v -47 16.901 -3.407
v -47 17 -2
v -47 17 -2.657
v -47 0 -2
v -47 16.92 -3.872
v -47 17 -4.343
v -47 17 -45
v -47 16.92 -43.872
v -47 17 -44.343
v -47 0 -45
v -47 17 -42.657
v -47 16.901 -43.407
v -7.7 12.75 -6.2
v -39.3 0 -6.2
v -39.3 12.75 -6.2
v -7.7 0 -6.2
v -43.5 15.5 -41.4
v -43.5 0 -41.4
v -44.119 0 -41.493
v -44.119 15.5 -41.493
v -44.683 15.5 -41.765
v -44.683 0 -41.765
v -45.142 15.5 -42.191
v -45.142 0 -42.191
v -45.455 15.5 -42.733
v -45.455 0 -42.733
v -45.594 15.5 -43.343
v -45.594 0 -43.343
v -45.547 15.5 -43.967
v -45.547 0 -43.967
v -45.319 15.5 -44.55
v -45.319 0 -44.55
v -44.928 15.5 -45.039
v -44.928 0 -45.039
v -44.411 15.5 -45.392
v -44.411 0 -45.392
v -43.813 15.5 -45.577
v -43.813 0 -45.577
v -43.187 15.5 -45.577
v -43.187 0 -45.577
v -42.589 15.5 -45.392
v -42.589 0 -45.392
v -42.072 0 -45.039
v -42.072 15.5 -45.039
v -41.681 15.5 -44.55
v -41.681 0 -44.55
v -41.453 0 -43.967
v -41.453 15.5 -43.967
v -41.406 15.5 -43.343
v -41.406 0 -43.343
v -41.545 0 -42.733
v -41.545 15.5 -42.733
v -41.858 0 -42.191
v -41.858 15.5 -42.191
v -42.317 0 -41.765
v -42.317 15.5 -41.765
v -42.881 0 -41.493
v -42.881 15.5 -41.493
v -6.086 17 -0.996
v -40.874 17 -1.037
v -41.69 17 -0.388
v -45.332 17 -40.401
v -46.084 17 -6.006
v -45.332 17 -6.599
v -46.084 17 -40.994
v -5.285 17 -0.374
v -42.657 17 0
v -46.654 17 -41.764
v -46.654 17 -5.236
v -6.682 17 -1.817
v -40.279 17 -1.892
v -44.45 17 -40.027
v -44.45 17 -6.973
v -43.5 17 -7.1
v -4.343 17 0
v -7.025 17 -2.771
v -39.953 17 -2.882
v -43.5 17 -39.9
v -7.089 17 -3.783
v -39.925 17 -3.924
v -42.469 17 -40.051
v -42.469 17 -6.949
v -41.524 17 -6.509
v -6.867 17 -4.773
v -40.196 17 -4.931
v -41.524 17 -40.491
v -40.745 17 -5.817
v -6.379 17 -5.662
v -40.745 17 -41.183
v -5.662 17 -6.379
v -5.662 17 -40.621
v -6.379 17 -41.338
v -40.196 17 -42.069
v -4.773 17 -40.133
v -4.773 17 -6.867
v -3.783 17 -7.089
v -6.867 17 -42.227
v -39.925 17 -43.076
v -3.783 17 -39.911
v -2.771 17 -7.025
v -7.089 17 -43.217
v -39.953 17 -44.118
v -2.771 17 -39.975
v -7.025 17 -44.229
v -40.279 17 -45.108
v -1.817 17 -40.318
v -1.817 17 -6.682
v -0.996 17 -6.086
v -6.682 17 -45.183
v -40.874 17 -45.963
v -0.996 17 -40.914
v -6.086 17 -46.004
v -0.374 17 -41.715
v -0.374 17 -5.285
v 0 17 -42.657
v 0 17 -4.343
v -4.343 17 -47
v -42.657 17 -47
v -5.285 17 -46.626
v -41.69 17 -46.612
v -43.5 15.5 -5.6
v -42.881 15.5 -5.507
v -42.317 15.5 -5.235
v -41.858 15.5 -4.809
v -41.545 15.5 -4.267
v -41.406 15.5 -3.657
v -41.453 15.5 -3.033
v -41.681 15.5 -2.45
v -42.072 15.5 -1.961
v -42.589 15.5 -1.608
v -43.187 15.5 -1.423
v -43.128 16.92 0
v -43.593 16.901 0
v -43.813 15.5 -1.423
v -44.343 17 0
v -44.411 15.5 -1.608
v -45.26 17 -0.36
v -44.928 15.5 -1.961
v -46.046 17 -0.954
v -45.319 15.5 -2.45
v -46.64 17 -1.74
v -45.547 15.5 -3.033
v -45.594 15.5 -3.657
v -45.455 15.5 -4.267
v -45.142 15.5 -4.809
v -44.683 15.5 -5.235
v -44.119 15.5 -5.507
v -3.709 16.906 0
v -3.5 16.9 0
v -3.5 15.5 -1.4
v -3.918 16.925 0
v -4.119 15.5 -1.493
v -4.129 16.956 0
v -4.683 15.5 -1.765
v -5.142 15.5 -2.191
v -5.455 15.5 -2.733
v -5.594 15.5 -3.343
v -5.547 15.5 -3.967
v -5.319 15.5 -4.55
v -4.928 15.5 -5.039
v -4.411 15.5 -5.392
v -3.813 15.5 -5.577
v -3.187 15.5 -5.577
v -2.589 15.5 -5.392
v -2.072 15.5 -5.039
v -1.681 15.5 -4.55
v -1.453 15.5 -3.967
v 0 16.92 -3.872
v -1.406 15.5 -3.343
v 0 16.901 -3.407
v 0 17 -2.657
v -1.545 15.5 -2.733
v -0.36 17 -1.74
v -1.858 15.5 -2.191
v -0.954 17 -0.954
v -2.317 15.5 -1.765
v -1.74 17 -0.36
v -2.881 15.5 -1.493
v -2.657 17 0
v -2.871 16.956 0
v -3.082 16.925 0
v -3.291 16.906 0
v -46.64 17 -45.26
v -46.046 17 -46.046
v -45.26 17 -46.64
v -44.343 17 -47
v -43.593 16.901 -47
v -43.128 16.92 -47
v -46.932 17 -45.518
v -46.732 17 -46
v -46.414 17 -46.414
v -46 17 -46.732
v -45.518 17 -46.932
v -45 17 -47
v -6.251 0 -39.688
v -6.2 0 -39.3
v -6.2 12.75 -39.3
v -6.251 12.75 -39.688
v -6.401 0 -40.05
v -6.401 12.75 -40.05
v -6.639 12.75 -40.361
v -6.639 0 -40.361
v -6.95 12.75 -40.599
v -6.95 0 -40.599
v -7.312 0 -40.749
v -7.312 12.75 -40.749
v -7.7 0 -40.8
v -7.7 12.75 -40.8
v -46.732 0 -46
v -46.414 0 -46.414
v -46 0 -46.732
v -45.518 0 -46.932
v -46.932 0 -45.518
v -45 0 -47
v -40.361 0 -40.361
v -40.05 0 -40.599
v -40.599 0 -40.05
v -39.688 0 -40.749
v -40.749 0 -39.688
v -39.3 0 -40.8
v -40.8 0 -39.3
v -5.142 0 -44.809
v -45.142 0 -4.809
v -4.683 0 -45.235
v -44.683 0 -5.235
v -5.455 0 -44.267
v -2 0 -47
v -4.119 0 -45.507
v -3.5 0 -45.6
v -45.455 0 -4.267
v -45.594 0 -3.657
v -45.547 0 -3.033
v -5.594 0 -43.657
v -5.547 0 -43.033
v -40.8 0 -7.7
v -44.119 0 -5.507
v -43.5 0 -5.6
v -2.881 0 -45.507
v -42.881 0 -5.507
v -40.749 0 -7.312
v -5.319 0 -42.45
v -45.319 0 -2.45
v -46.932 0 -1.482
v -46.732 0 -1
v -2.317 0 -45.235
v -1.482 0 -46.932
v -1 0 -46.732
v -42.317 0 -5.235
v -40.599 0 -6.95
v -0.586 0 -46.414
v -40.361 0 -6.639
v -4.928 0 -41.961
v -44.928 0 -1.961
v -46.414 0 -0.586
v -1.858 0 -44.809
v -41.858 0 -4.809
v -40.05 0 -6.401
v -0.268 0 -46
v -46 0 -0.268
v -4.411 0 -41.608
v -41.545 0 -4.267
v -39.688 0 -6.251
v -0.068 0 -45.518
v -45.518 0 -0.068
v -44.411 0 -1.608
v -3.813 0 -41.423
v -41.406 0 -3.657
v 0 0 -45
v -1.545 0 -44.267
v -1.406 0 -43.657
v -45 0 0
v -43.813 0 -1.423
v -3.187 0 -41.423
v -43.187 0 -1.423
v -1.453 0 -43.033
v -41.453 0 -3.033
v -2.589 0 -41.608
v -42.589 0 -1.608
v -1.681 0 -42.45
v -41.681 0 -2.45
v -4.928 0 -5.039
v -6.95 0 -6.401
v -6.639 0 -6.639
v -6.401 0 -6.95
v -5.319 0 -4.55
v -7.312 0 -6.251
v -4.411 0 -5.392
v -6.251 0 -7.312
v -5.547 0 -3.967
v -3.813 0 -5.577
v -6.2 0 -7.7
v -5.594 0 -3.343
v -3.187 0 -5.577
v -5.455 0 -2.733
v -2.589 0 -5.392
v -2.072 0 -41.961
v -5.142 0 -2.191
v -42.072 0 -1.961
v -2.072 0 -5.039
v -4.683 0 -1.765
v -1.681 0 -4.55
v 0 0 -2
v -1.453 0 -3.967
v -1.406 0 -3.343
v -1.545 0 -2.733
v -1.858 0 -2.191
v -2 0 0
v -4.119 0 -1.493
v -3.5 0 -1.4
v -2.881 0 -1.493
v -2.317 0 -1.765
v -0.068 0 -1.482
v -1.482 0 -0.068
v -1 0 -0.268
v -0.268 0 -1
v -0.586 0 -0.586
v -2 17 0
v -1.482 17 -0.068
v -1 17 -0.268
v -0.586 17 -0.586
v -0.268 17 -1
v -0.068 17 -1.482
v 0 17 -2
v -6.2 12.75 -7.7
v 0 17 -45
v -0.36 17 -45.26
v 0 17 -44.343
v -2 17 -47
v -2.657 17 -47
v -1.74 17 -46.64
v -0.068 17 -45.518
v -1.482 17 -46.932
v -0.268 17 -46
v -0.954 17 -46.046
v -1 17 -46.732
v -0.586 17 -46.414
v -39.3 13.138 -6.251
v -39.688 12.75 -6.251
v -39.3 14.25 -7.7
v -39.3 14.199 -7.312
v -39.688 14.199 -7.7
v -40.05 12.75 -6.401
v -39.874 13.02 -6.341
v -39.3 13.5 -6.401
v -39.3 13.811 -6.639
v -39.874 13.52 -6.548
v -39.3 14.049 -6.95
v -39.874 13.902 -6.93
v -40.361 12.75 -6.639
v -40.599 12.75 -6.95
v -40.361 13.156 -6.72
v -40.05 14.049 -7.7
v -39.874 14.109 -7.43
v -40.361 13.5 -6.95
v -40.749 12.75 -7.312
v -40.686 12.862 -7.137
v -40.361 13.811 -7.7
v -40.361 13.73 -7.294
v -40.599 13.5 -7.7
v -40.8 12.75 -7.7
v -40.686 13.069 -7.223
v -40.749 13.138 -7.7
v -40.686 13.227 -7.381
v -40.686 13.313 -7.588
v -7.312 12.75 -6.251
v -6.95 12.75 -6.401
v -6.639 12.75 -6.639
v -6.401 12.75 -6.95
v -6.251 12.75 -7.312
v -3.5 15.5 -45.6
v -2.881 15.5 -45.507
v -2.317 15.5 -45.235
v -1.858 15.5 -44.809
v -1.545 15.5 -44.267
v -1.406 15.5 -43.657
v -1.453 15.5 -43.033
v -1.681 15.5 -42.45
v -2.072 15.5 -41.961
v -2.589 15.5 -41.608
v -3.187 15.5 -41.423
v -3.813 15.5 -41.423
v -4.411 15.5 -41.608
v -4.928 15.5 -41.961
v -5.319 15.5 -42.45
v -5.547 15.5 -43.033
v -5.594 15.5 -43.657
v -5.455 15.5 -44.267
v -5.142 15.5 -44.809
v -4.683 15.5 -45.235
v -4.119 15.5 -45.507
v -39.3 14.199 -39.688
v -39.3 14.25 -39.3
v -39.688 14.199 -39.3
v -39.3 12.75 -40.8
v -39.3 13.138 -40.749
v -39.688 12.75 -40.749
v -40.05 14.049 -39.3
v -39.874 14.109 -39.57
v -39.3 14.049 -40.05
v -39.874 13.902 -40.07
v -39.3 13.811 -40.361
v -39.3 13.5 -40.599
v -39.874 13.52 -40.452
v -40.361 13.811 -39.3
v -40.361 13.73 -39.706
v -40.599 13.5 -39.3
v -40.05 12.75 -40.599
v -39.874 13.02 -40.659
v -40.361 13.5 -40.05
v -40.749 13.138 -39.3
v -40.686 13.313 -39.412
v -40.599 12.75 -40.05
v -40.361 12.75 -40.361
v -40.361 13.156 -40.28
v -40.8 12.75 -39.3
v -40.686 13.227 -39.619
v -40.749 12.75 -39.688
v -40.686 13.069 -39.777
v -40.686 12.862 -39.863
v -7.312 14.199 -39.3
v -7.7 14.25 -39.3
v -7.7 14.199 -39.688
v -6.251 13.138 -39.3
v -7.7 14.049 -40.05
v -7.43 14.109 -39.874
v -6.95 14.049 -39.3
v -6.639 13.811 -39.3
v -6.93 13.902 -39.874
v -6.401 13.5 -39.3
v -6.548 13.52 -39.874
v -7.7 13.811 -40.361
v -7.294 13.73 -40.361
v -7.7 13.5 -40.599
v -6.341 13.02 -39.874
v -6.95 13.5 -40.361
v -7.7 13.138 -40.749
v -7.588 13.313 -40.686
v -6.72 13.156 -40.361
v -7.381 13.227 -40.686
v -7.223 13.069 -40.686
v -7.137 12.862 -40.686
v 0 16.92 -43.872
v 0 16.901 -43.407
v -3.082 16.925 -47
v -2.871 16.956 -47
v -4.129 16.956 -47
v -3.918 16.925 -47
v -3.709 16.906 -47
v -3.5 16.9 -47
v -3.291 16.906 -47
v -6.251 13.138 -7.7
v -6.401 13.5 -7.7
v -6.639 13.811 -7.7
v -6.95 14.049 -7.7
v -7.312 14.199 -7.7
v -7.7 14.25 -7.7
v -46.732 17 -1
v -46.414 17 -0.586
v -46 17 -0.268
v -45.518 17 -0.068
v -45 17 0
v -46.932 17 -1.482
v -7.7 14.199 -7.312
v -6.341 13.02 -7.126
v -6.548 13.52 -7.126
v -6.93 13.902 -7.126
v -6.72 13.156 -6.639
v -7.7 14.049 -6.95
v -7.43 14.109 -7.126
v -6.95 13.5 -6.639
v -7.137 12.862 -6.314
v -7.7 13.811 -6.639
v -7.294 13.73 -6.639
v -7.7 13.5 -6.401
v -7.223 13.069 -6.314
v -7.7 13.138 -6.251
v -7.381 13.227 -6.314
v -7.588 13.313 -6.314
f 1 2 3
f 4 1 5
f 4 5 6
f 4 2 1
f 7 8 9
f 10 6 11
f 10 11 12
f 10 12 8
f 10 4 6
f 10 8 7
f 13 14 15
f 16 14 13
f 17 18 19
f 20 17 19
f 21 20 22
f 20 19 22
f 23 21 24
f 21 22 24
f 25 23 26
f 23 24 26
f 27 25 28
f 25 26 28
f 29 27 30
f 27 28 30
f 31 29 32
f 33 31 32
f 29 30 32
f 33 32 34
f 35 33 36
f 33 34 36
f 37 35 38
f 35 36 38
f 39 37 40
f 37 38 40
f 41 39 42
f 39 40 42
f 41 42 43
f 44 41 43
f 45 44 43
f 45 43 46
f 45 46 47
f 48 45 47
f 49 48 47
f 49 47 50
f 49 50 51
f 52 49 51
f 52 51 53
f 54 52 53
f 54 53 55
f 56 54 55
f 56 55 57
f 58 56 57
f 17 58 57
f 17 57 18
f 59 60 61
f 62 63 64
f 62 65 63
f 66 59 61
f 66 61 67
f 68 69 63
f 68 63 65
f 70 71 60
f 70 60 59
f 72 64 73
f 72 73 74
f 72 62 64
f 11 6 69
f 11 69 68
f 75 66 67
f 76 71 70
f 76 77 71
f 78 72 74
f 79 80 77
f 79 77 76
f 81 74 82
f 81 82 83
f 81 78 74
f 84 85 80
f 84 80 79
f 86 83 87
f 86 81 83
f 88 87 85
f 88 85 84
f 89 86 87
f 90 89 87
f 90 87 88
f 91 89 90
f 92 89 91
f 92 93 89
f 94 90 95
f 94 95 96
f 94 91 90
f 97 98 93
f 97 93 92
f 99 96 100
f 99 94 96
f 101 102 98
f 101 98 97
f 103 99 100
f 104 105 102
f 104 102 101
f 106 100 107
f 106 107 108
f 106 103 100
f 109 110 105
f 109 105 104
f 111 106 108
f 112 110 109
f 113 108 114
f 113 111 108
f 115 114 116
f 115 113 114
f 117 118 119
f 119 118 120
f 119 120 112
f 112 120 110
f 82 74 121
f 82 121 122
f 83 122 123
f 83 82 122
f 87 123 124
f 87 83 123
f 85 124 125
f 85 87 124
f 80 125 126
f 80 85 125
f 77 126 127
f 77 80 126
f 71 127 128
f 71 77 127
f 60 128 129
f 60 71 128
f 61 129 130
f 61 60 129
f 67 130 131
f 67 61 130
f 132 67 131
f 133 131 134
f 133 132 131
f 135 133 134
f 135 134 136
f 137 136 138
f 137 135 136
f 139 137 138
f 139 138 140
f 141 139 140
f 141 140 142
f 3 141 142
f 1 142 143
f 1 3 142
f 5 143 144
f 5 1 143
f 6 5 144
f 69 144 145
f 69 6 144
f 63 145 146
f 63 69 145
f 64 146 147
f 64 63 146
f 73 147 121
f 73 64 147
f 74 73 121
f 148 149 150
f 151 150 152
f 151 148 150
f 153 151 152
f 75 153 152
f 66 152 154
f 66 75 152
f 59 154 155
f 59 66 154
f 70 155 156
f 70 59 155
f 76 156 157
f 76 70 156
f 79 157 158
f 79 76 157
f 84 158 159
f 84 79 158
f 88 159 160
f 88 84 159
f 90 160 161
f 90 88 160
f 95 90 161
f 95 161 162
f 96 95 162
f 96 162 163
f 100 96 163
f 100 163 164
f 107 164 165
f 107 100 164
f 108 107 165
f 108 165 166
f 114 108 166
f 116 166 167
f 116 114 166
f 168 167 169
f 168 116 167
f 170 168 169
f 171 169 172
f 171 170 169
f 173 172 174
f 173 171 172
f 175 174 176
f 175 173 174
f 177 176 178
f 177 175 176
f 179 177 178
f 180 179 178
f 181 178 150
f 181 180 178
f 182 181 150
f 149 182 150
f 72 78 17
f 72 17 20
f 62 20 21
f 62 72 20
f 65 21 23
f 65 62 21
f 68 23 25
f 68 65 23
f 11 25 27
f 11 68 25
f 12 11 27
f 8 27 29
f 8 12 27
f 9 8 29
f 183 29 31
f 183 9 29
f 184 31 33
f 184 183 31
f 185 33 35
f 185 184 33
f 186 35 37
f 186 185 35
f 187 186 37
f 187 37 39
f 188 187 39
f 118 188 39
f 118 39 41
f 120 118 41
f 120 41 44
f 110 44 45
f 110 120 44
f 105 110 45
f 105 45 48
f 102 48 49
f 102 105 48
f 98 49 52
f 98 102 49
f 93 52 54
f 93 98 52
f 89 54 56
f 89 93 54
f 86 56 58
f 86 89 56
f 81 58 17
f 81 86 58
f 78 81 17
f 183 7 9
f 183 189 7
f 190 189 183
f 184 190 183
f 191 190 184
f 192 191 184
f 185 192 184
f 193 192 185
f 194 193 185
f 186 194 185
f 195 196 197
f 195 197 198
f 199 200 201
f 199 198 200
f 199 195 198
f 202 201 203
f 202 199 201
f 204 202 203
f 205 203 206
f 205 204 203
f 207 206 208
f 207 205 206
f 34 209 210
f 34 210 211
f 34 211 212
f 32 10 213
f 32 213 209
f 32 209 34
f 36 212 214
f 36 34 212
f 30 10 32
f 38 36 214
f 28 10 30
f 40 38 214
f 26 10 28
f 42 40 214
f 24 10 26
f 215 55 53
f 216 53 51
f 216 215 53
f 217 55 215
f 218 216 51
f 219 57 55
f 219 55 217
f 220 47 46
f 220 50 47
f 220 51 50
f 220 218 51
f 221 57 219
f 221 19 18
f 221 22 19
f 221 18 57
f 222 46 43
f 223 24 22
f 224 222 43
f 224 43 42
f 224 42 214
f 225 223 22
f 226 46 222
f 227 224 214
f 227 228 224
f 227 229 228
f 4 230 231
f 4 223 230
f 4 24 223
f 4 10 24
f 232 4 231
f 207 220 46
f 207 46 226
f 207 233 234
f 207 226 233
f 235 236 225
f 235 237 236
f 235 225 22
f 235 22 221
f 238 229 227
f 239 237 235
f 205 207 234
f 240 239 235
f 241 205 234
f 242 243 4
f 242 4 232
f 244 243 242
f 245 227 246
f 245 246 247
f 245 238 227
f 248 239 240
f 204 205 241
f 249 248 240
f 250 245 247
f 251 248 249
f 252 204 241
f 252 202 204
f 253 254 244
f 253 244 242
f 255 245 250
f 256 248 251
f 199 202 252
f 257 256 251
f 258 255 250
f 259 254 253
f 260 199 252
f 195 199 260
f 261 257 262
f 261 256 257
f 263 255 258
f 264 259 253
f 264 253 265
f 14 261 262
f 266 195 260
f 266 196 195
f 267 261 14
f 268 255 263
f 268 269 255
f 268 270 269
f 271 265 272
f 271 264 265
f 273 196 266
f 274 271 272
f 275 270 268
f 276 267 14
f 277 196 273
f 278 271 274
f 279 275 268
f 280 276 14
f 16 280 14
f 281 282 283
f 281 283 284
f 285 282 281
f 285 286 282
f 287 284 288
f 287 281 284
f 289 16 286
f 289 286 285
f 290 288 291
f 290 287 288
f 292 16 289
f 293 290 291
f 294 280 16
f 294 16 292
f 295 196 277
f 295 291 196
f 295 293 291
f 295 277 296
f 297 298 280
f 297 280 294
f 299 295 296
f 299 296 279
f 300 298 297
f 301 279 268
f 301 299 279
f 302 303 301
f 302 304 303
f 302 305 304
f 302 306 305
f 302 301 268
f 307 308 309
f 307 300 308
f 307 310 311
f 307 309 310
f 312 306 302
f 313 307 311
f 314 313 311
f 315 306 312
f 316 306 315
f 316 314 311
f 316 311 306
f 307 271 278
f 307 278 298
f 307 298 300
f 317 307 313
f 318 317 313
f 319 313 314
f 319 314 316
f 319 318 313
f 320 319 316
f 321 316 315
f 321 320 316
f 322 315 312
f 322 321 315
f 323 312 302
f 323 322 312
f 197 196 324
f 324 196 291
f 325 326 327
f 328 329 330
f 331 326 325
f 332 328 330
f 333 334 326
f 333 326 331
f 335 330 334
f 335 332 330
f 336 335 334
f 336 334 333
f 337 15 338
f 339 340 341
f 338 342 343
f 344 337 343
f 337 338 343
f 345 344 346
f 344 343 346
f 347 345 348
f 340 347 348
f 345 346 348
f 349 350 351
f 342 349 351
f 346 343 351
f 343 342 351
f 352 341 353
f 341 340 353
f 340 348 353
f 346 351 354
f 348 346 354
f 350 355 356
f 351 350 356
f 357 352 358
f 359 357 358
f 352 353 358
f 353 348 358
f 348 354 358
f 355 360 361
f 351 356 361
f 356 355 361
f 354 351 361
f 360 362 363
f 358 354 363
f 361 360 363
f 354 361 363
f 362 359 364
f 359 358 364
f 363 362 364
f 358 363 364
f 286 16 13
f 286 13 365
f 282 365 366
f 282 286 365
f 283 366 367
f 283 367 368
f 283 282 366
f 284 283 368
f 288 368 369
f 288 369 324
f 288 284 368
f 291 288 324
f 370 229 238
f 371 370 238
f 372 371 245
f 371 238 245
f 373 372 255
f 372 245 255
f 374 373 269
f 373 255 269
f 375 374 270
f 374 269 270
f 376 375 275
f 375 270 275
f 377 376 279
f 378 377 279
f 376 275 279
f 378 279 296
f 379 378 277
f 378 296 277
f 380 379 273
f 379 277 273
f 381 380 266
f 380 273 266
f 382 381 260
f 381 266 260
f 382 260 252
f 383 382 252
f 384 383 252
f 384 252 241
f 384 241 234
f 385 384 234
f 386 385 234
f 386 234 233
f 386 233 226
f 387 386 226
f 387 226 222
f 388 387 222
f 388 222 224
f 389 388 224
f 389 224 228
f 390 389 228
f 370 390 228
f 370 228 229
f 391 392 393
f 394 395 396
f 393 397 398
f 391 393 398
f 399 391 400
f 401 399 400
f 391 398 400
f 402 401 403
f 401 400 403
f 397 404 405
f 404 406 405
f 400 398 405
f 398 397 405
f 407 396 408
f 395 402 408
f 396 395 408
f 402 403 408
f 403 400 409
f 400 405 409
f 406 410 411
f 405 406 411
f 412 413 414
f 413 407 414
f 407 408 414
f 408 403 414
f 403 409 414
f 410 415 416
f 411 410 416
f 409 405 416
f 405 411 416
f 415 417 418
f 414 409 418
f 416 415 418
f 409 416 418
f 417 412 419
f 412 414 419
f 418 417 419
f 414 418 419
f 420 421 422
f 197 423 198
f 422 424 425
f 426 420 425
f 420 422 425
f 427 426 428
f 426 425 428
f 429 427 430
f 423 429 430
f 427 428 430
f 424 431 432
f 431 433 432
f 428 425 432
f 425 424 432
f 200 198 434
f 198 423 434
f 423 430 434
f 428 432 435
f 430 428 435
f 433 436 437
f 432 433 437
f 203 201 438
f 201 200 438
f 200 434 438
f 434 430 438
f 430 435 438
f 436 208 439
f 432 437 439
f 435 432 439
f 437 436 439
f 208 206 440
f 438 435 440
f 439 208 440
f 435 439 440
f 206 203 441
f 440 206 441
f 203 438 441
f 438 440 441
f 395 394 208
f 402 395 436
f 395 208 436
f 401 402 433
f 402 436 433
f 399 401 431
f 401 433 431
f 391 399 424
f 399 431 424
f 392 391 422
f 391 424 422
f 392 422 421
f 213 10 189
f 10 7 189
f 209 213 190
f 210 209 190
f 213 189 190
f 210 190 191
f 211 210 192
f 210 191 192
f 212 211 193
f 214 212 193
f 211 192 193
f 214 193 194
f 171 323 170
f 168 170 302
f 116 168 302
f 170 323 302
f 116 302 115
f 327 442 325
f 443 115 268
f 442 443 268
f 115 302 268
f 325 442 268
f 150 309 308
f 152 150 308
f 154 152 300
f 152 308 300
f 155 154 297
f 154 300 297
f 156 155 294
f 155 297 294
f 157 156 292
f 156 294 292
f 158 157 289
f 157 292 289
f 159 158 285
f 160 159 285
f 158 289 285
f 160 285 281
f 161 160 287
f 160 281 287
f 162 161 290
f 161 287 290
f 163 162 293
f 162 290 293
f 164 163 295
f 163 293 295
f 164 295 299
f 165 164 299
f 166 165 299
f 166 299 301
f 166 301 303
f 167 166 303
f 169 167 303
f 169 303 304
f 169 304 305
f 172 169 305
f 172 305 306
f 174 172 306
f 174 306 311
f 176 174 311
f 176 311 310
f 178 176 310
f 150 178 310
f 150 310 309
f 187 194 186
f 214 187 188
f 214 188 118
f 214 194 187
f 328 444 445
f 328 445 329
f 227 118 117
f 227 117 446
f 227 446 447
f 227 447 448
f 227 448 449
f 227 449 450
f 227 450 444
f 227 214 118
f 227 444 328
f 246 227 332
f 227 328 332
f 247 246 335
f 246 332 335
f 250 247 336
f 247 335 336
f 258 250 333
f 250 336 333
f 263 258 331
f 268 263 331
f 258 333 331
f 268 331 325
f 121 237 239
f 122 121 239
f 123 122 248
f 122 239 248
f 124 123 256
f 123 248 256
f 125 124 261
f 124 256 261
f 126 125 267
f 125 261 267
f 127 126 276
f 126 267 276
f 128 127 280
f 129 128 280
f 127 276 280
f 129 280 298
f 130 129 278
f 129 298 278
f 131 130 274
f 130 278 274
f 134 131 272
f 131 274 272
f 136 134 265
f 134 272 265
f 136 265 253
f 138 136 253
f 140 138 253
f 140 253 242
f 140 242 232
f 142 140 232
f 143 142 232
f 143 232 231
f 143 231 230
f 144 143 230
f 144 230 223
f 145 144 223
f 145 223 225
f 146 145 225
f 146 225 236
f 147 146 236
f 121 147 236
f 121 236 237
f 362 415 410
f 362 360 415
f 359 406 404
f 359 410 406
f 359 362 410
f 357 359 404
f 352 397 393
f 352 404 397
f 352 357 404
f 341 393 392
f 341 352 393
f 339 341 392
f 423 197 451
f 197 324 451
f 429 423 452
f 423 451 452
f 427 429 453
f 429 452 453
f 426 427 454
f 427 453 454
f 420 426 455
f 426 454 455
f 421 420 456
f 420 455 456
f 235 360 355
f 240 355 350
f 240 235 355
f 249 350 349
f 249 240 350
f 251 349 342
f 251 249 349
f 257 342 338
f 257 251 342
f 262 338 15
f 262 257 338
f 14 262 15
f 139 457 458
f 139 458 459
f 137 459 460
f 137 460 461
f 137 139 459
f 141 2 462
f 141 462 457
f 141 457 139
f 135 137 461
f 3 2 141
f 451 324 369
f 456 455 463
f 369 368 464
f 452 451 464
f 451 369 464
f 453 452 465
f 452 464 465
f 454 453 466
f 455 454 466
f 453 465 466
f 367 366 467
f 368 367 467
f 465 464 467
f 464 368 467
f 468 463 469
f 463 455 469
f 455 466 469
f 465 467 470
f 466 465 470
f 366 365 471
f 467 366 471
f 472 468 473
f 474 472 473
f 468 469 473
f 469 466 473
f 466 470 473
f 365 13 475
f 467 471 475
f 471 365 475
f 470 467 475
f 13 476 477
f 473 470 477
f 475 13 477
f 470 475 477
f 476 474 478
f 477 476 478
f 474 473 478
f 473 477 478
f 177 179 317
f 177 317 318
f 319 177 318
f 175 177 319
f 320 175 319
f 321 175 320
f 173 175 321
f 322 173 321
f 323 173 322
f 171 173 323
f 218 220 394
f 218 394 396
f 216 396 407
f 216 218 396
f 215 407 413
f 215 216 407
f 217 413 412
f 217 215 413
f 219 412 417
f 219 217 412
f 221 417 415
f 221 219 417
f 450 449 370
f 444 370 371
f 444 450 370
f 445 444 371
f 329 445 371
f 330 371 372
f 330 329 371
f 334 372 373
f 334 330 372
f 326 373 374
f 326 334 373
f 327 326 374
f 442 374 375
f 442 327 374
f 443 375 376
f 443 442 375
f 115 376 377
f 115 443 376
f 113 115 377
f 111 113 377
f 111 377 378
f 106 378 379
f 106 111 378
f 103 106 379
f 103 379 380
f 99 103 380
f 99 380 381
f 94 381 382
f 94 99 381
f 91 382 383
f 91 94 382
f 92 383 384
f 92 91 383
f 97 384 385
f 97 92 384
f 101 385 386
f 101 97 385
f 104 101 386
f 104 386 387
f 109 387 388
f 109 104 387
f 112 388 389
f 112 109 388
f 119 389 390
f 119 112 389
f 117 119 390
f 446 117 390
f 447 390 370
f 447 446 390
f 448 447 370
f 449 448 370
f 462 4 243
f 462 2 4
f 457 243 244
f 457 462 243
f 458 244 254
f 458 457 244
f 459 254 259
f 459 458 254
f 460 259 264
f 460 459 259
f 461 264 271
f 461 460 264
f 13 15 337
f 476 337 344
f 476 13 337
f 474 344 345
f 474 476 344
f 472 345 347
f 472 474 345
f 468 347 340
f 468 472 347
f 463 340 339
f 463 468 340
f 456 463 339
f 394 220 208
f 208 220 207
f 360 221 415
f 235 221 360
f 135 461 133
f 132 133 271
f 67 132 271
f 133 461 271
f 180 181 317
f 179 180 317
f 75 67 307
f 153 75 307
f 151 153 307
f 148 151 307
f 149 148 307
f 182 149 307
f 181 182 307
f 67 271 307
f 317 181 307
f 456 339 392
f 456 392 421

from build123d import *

# Parameters (mm, degrees)
SKETCH_1_W          = 47
SKETCH_1_H          = 47
EXTRUDE_1_DEPTH     = 17
SKETCH_2_R          = 2.1
CUT_EXTRUDE_1_DEPTH = 69.607579756
SKETCH_3_W          = 34.6
SKETCH_3_H          = 34.6
CUT_EXTRUDE_2_DEPTH = 14.25
FILLET_1_R          = 2
FILLET_2_R          = 1.5
CHAMFER_1_SIZE      = 1.5
FILLET_3_R          = 1.5


with BuildPart() as part:
    # Эскиз1 → Бобышка-Вытянуть1 (new body)
    with BuildSketch(Plane(origin=(0, 0, 0), x_dir=(1, 0, 0), z_dir=(0, 1, 0))):
        with Locations((-23.5, 23.5)):
            Rectangle(SKETCH_1_W, SKETCH_1_H)
    extrude(amount=EXTRUDE_1_DEPTH)

    # Эскиз2 → Вырез-Вытянуть1 (cut, through all)
    with BuildSketch(Plane.XZ):
        with Locations(Location((-43.5, -3.5, 0), (0, 0, 270))):
            Circle(SKETCH_2_R)
        with Locations(Location((-3.5, -3.5, 0), (0, 0, 90))):
            Circle(SKETCH_2_R)
        with Locations(Location((-3.5, -43.5, 0), (0, 0, 270))):
            Circle(SKETCH_2_R)
        with Locations(Location((-43.5, -43.5, 0), (0, 0, 90))):
            Circle(SKETCH_2_R)
    extrude(amount=-CUT_EXTRUDE_1_DEPTH, mode=Mode.SUBTRACT)

    # Эскиз3 → Вырез-Вытянуть2 (cut)
    with BuildSketch(Plane.XZ):
        with Locations((-23.5, -23.5)):
            Rectangle(SKETCH_3_W, SKETCH_3_H)
    extrude(amount=-CUT_EXTRUDE_2_DEPTH, mode=Mode.SUBTRACT)

    # Скругление1
    fillet_1_edges = [part.edges().sort_by_distance(p)[0] for p in [
        (0, 8.5, 0),
        (-47, 8.5, 0),
        (-47, 8.5, -47),
        (0, 8.5, -47),
    ]]
    fillet(fillet_1_edges, radius=FILLET_1_R)

    # Скругление2
    fillet_2_edges = [part.edges().sort_by_distance(p)[0] for p in [
        (-40.8, 14.25, -23.5),
        (-23.5, 14.25, -6.2),
        (-6.2, 14.25, -23.5),
        (-23.5, 14.25, -40.8),
    ]]
    fillet(fillet_2_edges, radius=FILLET_2_R)

    # Фаска1
    # the kernel refuses this chamfer: 1.5 mm, written as the material it takes off along each edge
    with BuildSketch(Plane(origin=(-43.5, 17, -43.5), x_dir=(0, 0, 1), z_dir=(1, 0, 0))) as chamfer_1_piece_1:
        Polygon((2.1, CHAMFER_1_SIZE), (2.1 + CHAMFER_1_SIZE, 0), (2.1, 0), align=None)
    revolve(axis=Axis((-43.5, 17, -43.5), (0, -1, 0)), mode=Mode.SUBTRACT)
    with BuildSketch(Plane(origin=(-3.5, 17, -43.5), x_dir=(0, 0, -1), z_dir=(-1, 0, 0))) as chamfer_1_piece_2:
        Polygon((2.1, CHAMFER_1_SIZE), (2.1 + CHAMFER_1_SIZE, 0), (2.1, 0), align=None)
    revolve(axis=Axis((-3.5, 17, -43.5), (0, -1, 0)), mode=Mode.SUBTRACT)
    with BuildSketch(Plane(origin=(-3.5, 17, -3.5), x_dir=(0, 0, 1), z_dir=(1, 0, 0))) as chamfer_1_piece_3:
        Polygon((2.1, CHAMFER_1_SIZE), (2.1 + CHAMFER_1_SIZE, 0), (2.1, 0), align=None)
    revolve(axis=Axis((-3.5, 17, -3.5), (0, -1, 0)), mode=Mode.SUBTRACT)
    with BuildSketch(Plane(origin=(-43.5, 17, -3.5), x_dir=(0, 0, -1), z_dir=(-1, 0, 0))) as chamfer_1_piece_4:
        Polygon((2.1, CHAMFER_1_SIZE), (2.1 + CHAMFER_1_SIZE, 0), (2.1, 0), align=None)
    revolve(axis=Axis((-43.5, 17, -3.5), (0, -1, 0)), mode=Mode.SUBTRACT)

    # Скругление3
    # the kernel refuses this fillet: 1.5 mm, written as the material it adds along each edge
    with BuildSketch(Plane(origin=(-39.3, 12.75, -39.3), x_dir=(0, 0, -1), z_dir=(-1, 0, 0))) as fillet_3_piece_1_section:
        Polygon((0, 0), (FILLET_3_R, 0), (FILLET_3_R, -FILLET_3_R), (0, -FILLET_3_R), align=None)
    fillet_3_piece_1 = extrude(amount=FILLET_3_R, mode=Mode.PRIVATE)
    fillet_3_piece_1 = fillet_3_piece_1 - Plane(origin=(-39.3, 12.75, -39.3), x_dir=(0, -0.7071067811865475, 0.7071067811865475), z_dir=(-1, 0, 0)) * Sphere(FILLET_3_R, mode=Mode.PRIVATE)
    add(fillet_3_piece_1)
    with BuildSketch(Plane(origin=(-39.3, 12.75, -7.7), x_dir=(0, 0, 1), z_dir=(-1, 0, 0))) as fillet_3_piece_2_section:
        Polygon((0, 0), (FILLET_3_R, 0), (FILLET_3_R, FILLET_3_R), (0, FILLET_3_R), align=None)
    fillet_3_piece_2 = extrude(amount=FILLET_3_R, mode=Mode.PRIVATE)
    fillet_3_piece_2 = fillet_3_piece_2 - Plane(origin=(-39.3, 12.75, -7.7), x_dir=(0, -0.7071067811865475, -0.7071067811865475), z_dir=(-1, 0, 0)) * Sphere(FILLET_3_R, mode=Mode.PRIVATE)
    add(fillet_3_piece_2)
    with BuildSketch(Plane(origin=(-7.7, 12.75, -39.3), x_dir=(1, 0, 0), z_dir=(0, 0, -1))) as fillet_3_piece_3_section:
        Polygon((0, 0), (FILLET_3_R, 0), (FILLET_3_R, -FILLET_3_R), (0, -FILLET_3_R), align=None)
    fillet_3_piece_3 = extrude(amount=FILLET_3_R, mode=Mode.PRIVATE)
    fillet_3_piece_3 = fillet_3_piece_3 - Plane(origin=(-7.7, 12.75, -39.3), x_dir=(-0.7071067811865475, -0.7071067811865475, 0), z_dir=(0, 0, -1)) * Sphere(FILLET_3_R, mode=Mode.PRIVATE)
    add(fillet_3_piece_3)
    with BuildSketch(Plane(origin=(-7.7, 12.75, -7.7), x_dir=(1, 0, 0), z_dir=(0, 0, 1))) as fillet_3_piece_4_section:
        Polygon((0, 0), (FILLET_3_R, 0), (FILLET_3_R, FILLET_3_R), (0, FILLET_3_R), align=None)
    fillet_3_piece_4 = extrude(amount=FILLET_3_R, mode=Mode.PRIVATE)
    fillet_3_piece_4 = fillet_3_piece_4 - Plane(origin=(-7.7, 12.75, -7.7), x_dir=(-0.7071067811865475, -0.7071067811865475, 0), z_dir=(0, 0, 1)) * Sphere(FILLET_3_R, mode=Mode.PRIVATE)
    add(fillet_3_piece_4)
    with BuildSketch(Plane(origin=(-6.2, 0, -6.2), x_dir=(-1, 0, 0), z_dir=(0, 1, 0)), Plane(origin=(-40.8, 0, -6.2), x_dir=(0, 0, -1), z_dir=(0, 1, 0))) as fillet_3_piece_5:
        with BuildLine():
            CenterArc((FILLET_3_R, -FILLET_3_R), FILLET_3_R, 90, 90)
            Line((0, -FILLET_3_R), (0, 0))
            Line((0, 0), (FILLET_3_R, 0))
        make_face()
    extrude(amount=12.75)
    with BuildSketch(Plane(origin=(-6.2, 0, -40.8), x_dir=(-1, 0, 0), z_dir=(0, 1, 0)), Plane(origin=(-40.8, 0, -40.8), x_dir=(0, 0, 1), z_dir=(0, 1, 0))) as fillet_3_piece_6:
        with BuildLine():
            CenterArc((FILLET_3_R, FILLET_3_R), FILLET_3_R, 180, 90)
            Line((0, FILLET_3_R), (0, 0))
            Line((0, 0), (FILLET_3_R, 0))
        make_face()
    extrude(amount=12.75)


solid = part.part
